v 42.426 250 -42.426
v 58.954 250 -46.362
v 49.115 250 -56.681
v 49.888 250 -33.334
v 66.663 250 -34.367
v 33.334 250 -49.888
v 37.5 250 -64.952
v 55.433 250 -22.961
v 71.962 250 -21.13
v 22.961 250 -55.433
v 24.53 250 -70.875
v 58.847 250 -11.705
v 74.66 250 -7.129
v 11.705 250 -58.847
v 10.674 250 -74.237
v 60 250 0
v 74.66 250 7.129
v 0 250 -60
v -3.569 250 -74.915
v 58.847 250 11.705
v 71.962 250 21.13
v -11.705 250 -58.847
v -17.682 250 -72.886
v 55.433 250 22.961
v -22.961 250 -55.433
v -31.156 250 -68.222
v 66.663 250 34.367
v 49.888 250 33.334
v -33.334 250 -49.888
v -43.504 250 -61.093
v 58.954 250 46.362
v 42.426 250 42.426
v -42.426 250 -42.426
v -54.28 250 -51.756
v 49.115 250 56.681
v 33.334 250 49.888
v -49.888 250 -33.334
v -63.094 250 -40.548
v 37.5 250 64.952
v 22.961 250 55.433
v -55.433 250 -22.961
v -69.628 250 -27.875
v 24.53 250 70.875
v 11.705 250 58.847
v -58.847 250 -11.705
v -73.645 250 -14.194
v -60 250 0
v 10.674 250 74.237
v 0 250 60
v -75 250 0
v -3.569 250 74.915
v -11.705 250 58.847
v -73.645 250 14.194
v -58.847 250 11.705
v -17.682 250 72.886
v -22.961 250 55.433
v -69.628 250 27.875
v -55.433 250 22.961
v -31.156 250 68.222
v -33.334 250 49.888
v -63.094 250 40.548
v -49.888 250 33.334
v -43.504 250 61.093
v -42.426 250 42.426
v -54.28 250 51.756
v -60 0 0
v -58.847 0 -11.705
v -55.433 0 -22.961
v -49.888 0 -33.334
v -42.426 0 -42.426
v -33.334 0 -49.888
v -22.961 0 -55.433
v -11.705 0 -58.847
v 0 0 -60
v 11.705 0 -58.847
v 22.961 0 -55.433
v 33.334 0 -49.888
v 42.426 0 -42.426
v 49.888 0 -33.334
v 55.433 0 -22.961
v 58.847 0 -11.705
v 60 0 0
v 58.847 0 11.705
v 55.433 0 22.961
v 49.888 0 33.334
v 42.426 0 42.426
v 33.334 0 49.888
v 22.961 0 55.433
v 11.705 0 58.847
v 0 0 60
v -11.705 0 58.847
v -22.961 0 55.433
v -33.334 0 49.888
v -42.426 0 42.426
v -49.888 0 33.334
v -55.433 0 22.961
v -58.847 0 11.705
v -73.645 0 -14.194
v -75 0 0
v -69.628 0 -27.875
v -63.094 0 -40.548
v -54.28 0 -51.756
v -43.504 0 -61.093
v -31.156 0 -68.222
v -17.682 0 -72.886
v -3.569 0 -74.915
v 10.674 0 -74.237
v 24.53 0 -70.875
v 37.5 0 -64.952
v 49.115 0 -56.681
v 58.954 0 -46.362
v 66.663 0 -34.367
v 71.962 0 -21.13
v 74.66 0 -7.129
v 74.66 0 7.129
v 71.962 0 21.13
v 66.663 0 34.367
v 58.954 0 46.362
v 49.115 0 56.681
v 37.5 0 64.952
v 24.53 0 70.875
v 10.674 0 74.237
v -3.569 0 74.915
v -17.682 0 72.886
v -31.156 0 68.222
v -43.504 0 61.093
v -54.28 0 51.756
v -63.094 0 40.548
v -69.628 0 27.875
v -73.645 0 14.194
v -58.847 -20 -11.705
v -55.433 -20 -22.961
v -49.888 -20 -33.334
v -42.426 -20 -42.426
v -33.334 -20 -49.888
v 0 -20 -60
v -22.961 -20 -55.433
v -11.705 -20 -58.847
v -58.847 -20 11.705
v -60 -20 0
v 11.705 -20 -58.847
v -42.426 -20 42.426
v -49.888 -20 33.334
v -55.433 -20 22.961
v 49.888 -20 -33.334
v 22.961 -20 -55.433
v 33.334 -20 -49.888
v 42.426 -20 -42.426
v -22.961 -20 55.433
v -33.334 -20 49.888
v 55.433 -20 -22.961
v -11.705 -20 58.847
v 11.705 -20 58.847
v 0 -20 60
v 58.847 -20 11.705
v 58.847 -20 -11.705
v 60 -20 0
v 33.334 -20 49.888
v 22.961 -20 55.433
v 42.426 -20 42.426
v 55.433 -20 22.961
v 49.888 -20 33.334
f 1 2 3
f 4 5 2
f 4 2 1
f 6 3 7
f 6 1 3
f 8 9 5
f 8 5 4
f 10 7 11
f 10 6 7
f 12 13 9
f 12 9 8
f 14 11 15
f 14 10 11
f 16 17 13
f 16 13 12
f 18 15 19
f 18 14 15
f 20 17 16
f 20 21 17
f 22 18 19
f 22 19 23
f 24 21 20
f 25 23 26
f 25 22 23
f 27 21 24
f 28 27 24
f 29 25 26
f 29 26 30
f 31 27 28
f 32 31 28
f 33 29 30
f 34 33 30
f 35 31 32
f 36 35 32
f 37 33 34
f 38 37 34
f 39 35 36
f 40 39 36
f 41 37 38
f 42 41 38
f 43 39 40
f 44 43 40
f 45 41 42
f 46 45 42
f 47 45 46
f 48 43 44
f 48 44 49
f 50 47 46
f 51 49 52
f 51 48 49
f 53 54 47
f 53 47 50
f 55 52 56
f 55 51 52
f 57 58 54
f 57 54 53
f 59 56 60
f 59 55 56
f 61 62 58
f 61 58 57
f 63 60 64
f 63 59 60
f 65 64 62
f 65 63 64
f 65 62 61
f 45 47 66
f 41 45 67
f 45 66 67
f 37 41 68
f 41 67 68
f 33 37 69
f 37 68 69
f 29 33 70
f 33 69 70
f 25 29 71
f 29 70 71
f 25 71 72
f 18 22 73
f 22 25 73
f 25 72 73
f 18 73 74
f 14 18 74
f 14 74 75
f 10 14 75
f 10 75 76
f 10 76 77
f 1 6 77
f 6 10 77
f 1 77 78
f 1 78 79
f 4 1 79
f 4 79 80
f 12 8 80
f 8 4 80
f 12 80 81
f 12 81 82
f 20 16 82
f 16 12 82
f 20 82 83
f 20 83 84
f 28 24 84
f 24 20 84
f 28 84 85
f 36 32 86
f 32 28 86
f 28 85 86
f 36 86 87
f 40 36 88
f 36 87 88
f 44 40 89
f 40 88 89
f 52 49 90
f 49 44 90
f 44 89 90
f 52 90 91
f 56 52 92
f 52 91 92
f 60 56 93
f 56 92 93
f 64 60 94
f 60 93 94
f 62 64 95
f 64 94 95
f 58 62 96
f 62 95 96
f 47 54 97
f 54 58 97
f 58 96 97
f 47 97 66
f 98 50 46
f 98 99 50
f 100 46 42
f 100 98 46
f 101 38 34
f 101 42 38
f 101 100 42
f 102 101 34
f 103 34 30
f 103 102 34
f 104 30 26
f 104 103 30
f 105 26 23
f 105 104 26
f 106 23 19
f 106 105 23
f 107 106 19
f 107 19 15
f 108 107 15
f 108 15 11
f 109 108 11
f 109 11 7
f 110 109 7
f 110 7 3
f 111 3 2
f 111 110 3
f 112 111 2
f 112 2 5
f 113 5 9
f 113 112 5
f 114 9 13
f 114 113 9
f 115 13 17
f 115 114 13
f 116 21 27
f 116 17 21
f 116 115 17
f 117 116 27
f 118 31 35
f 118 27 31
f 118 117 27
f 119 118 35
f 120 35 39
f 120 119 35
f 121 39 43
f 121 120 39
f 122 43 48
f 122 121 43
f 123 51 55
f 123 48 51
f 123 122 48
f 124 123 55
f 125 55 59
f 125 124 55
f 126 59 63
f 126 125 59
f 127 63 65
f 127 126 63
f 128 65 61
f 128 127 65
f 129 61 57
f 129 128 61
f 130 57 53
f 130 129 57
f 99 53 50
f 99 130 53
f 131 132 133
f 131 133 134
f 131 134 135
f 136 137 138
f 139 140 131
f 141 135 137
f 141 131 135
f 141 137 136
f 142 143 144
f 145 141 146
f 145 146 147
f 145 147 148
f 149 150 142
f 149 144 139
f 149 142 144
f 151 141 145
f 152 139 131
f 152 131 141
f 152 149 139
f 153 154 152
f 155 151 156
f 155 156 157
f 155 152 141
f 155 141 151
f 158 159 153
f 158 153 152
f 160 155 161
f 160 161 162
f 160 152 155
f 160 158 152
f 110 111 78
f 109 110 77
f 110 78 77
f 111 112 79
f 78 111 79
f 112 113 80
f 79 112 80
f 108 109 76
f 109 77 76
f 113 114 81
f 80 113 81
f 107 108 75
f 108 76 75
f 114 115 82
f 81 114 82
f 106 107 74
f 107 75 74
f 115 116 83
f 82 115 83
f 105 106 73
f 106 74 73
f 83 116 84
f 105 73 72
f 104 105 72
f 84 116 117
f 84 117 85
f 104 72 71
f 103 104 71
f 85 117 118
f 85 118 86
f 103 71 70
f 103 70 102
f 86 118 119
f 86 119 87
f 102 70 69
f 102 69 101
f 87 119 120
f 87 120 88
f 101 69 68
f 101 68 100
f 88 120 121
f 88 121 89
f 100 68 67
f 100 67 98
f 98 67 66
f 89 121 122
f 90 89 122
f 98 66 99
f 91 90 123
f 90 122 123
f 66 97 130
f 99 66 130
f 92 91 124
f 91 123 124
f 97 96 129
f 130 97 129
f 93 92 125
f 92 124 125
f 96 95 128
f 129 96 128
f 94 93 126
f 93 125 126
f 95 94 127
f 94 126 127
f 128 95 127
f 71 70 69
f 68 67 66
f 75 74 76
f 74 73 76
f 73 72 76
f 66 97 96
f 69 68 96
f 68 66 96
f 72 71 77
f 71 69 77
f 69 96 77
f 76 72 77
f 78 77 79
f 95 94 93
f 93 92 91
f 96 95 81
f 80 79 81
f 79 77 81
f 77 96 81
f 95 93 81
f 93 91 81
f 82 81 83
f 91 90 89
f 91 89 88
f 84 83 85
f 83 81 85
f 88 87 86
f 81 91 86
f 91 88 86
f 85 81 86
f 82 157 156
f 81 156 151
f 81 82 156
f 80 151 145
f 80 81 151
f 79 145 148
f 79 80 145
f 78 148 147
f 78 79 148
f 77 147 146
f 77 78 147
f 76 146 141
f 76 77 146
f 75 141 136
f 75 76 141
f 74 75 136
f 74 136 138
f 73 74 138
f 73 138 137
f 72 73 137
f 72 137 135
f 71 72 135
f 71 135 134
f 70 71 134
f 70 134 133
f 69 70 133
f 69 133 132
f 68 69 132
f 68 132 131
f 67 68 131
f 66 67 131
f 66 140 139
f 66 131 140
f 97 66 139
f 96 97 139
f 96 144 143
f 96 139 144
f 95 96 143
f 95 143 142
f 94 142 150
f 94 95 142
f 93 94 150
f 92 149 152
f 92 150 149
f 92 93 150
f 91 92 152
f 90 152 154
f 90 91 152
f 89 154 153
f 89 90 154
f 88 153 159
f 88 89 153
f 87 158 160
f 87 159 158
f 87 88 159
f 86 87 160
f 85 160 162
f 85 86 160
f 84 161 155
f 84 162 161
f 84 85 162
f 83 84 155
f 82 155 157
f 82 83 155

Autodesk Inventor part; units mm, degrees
ref_plane "YZ Plane" through (0, 0, 0) normal (1, 0, 0) x (0, 1, 0)
ref_plane "XZ Plane" through (0, 0, 0) normal (0, 1, 0) x (-1, 0, 0)
ref_plane "XY Plane" through (0, 0, 0) normal (0, 0, 1) x (1, 0, 0)
sketch "Sketch1" plane through (0, 0, 0) normal (0, 1, 0) x (-1, 0, 0)
  circle A0 centre (0, 0) radius 75
  circle A1 centre (0, 0) radius 60
  dimension "d0" = 150
  dimension "d1" = 120
extrude "Extrusion1" add sketch "Sketch1" along normal blind 250
sketch "Sketch3" plane through (0, 0, 0) normal (0, -1, 0) x (1, 0, 0)
  circle A0 centre (0, 0) radius 60
extrude "Extrusion2" add sketch "Sketch3" along normal blind 20
properties part number "Stand1" material "Stainless Steel, Austenitic"
